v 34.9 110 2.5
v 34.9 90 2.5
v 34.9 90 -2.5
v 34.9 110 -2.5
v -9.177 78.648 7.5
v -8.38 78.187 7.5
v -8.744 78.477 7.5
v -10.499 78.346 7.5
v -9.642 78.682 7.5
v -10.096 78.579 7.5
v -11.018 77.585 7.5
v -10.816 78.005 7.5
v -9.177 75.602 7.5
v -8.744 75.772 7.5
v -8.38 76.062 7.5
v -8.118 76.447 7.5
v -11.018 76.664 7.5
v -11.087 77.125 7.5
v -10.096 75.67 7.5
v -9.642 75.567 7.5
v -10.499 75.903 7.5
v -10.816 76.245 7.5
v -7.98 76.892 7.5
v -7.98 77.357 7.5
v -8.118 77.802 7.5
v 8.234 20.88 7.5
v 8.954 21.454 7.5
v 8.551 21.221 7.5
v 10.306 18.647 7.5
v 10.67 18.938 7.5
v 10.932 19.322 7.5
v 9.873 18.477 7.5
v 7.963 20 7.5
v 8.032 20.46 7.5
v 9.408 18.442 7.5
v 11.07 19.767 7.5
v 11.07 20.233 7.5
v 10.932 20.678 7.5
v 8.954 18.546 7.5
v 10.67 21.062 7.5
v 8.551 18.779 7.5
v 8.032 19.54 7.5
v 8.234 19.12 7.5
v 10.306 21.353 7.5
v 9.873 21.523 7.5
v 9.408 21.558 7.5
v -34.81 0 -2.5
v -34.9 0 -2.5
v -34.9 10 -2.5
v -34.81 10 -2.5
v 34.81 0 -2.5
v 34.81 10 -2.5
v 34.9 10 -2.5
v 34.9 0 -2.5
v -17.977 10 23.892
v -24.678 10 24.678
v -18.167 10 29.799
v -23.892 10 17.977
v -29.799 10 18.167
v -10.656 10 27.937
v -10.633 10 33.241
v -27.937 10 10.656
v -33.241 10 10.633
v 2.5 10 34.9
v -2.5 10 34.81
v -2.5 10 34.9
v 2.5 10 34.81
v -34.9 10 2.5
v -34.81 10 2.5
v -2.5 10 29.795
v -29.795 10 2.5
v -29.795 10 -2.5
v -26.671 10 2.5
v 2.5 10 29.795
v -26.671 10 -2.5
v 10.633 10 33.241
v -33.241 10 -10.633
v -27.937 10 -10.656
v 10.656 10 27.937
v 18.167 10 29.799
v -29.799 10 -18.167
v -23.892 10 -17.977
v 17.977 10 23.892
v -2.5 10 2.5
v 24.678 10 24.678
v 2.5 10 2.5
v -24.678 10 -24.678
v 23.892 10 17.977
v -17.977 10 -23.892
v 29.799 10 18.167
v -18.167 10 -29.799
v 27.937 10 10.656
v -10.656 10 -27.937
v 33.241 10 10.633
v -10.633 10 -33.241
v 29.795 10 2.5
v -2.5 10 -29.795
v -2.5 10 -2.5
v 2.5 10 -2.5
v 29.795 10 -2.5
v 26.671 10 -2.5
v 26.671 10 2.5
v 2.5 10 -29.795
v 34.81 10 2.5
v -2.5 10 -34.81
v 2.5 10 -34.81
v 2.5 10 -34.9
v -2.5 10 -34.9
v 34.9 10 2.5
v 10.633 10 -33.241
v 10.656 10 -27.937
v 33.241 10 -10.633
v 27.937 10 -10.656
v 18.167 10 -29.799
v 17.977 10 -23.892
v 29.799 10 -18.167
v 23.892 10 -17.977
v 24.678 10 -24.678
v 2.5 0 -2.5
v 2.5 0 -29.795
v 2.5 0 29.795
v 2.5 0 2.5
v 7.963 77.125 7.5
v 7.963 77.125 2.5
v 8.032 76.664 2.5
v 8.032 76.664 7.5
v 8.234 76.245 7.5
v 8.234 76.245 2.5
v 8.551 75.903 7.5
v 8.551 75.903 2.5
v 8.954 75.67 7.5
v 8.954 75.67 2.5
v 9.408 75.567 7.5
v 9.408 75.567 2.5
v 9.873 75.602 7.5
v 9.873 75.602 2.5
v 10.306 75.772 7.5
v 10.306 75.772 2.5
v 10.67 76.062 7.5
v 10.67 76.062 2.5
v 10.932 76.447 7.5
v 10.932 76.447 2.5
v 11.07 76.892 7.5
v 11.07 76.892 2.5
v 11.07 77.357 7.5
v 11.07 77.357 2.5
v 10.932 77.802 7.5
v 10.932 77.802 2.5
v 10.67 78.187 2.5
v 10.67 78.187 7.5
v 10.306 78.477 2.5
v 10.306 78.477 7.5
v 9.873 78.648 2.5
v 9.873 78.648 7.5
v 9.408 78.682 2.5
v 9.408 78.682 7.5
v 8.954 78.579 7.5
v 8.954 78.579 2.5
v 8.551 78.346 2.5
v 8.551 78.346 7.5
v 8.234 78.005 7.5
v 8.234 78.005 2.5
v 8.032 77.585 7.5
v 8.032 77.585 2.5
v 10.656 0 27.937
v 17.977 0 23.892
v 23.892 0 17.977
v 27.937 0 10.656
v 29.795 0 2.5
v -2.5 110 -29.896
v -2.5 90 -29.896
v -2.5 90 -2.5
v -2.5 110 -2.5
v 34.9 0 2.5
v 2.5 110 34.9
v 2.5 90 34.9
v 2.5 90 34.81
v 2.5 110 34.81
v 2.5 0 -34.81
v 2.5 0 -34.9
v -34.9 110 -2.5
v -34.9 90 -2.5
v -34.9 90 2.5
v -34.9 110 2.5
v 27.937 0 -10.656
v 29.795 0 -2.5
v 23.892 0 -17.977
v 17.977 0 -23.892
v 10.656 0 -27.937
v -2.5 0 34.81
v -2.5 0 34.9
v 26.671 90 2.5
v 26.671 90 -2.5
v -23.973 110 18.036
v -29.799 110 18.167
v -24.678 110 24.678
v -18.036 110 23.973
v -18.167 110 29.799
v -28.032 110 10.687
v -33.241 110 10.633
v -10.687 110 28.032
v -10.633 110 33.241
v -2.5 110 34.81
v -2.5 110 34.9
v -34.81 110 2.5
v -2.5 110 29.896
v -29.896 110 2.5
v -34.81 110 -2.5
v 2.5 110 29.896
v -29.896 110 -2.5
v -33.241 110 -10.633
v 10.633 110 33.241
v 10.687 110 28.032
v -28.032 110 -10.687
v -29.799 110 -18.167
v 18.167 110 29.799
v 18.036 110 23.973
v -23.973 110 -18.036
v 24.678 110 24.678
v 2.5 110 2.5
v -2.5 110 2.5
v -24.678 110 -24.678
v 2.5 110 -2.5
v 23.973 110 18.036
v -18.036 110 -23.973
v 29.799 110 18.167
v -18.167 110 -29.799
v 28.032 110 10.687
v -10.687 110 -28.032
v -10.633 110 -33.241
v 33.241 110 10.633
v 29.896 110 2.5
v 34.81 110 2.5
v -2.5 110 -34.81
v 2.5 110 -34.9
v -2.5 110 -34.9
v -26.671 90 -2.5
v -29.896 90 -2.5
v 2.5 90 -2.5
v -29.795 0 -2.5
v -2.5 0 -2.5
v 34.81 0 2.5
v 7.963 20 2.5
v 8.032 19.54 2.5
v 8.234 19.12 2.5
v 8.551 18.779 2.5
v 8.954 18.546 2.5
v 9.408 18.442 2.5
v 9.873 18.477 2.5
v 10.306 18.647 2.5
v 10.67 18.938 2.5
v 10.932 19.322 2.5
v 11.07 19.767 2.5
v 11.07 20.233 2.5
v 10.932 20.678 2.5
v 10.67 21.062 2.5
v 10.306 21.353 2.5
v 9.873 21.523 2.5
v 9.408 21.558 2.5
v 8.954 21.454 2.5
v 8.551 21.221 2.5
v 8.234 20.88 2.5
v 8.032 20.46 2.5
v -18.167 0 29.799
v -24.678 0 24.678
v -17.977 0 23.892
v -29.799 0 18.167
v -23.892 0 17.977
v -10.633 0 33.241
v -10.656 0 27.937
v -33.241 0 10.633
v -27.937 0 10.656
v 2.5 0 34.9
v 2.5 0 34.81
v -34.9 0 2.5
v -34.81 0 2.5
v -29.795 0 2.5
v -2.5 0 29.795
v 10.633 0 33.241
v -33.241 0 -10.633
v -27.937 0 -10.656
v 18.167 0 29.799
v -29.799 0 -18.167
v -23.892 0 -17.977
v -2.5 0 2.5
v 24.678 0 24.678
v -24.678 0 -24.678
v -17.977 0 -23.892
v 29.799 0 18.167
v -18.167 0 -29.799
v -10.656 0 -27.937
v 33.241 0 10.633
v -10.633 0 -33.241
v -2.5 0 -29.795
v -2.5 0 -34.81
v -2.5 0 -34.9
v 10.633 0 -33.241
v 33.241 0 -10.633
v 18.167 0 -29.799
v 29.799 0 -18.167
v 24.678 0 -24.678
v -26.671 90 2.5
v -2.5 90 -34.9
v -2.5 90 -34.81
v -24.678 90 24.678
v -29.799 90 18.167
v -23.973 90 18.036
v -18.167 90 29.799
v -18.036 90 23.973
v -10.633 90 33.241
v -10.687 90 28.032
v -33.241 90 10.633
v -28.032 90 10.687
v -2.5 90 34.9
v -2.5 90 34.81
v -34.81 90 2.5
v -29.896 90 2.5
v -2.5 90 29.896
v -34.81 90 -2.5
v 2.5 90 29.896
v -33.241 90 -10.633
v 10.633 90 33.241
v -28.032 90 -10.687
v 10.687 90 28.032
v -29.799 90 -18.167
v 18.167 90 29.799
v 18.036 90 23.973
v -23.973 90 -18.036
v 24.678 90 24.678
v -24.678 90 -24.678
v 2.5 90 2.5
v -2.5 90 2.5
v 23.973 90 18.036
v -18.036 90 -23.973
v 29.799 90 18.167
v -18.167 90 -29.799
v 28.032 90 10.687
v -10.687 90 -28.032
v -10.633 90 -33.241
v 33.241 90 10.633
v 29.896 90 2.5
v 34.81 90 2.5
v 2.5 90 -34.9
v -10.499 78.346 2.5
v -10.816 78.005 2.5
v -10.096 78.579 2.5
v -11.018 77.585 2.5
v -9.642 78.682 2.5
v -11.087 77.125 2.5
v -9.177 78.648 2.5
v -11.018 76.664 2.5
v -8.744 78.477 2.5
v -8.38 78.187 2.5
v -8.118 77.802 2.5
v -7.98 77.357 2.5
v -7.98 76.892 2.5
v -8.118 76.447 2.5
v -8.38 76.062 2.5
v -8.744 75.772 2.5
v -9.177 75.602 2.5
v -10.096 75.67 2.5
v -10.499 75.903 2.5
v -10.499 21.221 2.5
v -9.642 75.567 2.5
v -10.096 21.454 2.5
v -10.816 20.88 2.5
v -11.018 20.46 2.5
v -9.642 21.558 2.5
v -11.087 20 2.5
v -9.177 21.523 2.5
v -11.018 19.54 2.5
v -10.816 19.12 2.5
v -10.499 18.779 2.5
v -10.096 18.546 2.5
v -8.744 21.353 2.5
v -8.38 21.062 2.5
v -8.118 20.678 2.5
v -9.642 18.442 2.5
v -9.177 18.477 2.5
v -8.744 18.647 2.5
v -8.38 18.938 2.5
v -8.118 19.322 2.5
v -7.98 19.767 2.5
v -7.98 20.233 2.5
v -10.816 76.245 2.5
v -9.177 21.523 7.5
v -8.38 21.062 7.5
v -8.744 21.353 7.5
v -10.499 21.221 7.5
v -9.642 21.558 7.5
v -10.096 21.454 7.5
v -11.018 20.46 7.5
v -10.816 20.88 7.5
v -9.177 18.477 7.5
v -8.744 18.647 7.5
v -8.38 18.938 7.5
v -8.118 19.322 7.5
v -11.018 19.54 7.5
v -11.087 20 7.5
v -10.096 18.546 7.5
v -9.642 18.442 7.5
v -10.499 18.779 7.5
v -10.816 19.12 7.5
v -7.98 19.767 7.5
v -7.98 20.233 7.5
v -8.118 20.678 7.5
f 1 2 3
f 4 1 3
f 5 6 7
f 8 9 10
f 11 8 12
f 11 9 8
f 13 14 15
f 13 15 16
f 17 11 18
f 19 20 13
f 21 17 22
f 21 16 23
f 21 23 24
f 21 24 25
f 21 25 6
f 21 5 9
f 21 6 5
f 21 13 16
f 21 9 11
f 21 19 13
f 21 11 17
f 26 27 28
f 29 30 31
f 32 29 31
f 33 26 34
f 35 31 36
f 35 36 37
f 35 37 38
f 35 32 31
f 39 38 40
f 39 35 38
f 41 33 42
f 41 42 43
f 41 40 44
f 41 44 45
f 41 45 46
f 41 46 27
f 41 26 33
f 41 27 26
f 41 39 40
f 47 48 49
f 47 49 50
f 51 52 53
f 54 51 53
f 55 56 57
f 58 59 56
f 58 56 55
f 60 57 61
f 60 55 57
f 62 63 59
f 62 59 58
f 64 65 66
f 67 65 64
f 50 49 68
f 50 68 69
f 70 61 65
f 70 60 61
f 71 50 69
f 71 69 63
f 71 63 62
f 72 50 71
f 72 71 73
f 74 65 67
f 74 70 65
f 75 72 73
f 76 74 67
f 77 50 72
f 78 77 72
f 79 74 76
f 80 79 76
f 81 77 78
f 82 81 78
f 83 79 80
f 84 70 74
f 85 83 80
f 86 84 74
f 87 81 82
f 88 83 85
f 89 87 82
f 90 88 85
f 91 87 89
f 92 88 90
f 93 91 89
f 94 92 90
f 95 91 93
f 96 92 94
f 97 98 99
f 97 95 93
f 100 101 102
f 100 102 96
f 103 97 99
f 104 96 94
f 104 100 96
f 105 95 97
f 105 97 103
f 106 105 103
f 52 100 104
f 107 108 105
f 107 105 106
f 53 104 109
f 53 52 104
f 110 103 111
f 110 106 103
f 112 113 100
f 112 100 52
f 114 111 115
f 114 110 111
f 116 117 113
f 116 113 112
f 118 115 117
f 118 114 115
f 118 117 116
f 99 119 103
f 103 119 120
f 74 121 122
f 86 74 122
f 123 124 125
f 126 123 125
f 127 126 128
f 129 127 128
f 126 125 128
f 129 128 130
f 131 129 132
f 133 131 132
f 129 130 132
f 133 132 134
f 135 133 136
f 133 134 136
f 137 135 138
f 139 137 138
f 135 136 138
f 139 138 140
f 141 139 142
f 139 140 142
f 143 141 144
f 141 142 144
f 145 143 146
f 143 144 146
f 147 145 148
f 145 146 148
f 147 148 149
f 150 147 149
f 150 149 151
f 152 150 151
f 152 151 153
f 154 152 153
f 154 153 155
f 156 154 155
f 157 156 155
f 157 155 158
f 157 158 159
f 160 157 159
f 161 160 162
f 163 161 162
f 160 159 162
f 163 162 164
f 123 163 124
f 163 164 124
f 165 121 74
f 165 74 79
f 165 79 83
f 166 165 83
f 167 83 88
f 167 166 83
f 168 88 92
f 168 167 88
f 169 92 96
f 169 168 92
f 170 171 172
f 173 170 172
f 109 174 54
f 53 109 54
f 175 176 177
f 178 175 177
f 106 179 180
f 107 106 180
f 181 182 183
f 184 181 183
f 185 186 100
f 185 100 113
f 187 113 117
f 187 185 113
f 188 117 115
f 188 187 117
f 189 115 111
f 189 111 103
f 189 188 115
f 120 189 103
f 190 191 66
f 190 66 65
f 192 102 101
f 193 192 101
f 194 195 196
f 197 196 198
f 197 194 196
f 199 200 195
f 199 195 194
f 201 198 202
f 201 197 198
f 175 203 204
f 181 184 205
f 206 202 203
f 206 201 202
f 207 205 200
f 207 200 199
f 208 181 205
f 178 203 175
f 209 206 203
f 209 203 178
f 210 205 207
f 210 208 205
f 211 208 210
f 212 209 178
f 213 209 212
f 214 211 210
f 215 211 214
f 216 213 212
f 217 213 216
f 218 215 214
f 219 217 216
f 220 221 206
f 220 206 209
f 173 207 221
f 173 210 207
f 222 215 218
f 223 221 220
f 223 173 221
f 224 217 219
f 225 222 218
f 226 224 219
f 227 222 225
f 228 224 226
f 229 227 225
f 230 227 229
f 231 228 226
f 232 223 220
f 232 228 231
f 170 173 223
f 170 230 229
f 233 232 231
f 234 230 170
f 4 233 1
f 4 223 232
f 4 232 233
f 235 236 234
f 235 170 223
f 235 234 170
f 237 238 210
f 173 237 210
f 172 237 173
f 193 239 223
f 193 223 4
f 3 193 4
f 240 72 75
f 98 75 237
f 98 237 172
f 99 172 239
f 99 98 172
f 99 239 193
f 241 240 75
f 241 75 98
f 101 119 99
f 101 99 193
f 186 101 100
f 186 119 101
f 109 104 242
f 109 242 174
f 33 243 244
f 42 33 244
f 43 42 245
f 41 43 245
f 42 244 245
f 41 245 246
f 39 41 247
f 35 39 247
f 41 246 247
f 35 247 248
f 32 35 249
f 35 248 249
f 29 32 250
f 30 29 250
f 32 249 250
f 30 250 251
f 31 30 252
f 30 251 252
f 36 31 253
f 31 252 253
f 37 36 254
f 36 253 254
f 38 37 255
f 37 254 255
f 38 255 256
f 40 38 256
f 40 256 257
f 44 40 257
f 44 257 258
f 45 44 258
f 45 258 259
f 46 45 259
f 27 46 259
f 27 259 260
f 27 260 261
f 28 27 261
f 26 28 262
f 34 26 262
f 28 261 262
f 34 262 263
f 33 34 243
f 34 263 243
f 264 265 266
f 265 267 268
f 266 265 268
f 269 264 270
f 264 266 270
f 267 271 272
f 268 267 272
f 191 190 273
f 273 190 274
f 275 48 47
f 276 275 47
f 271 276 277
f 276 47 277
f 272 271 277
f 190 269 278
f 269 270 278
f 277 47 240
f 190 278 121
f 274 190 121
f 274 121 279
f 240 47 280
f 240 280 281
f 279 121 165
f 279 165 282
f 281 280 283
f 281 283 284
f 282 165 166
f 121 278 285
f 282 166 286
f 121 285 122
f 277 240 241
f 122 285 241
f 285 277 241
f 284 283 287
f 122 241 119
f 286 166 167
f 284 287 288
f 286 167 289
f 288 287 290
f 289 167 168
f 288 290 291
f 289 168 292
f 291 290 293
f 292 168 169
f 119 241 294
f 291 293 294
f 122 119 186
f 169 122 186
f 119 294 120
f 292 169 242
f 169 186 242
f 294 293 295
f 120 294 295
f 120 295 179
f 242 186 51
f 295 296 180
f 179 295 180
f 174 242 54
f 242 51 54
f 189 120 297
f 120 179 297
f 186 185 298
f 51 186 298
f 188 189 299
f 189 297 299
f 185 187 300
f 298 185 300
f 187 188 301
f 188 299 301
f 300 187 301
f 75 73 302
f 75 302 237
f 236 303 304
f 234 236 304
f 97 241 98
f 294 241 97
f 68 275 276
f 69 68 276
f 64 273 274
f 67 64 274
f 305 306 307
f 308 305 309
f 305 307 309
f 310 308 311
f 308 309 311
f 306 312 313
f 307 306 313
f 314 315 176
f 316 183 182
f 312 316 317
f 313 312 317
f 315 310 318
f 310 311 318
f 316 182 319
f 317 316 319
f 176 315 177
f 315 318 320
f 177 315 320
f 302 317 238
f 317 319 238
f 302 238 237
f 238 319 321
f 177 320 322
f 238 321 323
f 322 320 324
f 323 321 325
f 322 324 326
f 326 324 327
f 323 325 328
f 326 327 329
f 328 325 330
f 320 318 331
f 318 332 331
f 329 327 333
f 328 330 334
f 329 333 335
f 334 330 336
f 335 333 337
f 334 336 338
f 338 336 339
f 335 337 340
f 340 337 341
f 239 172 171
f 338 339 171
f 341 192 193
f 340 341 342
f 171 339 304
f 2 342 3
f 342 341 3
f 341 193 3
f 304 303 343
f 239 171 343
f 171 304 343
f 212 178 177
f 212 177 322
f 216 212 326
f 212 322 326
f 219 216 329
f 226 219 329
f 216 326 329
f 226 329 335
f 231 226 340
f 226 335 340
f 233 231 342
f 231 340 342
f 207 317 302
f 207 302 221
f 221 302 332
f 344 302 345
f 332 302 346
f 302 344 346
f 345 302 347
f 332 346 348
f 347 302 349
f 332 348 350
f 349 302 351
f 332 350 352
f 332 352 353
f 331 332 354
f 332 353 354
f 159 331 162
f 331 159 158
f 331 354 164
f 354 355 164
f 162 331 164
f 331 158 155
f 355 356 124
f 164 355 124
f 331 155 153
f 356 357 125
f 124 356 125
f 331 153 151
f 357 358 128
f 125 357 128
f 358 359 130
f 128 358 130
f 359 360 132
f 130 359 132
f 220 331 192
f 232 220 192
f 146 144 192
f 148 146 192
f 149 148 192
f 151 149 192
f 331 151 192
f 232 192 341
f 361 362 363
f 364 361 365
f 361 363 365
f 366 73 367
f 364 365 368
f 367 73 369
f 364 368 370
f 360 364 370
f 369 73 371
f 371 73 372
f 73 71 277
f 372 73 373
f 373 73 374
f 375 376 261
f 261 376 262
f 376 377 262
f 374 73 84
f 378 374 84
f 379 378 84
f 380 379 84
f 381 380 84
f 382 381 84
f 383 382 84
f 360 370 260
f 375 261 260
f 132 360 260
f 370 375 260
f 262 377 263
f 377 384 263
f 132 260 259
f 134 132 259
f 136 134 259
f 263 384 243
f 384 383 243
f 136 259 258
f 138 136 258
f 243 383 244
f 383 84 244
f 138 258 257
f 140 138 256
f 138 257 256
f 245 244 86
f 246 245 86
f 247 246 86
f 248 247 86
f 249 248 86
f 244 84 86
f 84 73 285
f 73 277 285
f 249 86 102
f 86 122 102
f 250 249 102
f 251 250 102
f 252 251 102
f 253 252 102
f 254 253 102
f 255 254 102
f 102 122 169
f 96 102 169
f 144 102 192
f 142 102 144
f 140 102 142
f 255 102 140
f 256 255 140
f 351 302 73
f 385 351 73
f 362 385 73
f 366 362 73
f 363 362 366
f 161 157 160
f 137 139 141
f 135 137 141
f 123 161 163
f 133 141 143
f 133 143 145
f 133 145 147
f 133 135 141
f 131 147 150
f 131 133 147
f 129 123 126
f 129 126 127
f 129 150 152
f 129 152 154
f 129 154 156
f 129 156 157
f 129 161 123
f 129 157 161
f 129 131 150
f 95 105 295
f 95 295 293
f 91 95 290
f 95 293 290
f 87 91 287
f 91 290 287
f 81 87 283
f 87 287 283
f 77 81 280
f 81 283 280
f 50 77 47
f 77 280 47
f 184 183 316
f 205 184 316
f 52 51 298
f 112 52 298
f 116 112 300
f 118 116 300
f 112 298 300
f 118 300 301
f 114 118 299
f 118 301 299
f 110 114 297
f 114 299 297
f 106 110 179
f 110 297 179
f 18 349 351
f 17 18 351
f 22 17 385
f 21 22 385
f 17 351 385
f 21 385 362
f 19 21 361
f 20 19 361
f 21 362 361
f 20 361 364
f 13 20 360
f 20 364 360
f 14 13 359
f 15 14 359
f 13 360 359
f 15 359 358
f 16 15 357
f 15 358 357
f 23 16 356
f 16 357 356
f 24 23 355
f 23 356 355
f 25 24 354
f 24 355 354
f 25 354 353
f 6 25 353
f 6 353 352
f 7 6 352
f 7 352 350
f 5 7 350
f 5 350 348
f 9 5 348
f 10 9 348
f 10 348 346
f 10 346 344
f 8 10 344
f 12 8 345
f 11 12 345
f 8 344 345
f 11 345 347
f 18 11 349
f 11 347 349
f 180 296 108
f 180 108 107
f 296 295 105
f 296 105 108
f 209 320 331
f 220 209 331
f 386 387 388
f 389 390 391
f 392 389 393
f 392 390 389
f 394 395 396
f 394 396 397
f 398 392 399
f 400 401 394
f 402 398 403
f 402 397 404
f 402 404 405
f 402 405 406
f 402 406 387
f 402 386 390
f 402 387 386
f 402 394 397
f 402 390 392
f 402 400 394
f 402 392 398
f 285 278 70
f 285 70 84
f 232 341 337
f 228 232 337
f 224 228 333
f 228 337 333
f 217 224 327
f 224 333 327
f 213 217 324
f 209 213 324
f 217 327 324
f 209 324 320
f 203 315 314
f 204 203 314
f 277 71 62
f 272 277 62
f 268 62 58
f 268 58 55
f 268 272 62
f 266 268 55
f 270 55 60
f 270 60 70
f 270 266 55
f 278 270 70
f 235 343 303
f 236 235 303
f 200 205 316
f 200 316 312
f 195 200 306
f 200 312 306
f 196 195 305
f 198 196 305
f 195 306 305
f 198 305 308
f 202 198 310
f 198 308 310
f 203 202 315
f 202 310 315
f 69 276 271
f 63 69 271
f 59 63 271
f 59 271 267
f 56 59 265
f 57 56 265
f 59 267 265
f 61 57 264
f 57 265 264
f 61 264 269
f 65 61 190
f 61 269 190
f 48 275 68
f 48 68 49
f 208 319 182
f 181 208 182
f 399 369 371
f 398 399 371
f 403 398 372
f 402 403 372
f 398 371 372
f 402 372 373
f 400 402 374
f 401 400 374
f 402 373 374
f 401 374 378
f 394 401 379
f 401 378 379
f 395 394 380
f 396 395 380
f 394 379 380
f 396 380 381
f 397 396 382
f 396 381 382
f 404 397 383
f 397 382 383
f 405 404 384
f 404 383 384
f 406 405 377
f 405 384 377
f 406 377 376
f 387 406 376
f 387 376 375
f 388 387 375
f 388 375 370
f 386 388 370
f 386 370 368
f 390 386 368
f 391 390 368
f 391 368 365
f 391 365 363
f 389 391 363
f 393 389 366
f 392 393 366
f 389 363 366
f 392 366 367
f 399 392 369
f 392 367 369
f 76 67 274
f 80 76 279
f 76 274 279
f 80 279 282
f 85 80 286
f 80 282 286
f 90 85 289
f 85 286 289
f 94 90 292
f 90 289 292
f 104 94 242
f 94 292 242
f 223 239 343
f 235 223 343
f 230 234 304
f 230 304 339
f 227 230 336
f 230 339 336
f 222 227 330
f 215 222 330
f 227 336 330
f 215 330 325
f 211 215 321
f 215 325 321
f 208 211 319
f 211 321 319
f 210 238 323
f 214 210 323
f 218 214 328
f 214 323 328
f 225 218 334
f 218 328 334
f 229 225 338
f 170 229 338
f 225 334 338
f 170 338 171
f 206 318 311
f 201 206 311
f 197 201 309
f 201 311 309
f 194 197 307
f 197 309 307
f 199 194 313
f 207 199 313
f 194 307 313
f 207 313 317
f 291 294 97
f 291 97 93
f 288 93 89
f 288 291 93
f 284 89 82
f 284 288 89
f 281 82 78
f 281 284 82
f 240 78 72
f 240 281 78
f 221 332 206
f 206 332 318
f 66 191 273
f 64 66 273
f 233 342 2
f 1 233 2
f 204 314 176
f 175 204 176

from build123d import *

# Parameters (mm, degrees)
SKETCH1_R           = 34.9
SKETCH1_R_2         = 29.9
EXTRUDE_THIN1_DEPTH = 10
SKETCH1_3_W         = 5
SKETCH1_3_H         = 69.8
SKETCH1_3_W_2       = 69.8
SKETCH1_3_H_2       = 5
EXTRUDE_THIN2_DEPTH = 10
SKETCH2_W           = 53.342781532
SKETCH2_H           = 5
BOSS_EXTRUDE1_DEPTH = 80
SKETCH3_R           = 1.5621
BOSS_EXTRUDE2_DEPTH = 5
BOSS_EXTRUDE4_DEPTH = 20
SKETCH6_6_W         = 5
SKETCH6_6_H         = 69.8
SKETCH6_6_W_2       = 69.8
SKETCH6_6_H_2       = 5
EXTRUDE_THIN4_DEPTH = 20


with BuildPart() as part:
    # Sketch1 → Extrude-Thin1 (new body)
    with BuildSketch(Plane(origin=(0, 0, 0), x_dir=(1, 0, 0), z_dir=(0, 1, 0))):
        Circle(SKETCH1_R)
        Circle(SKETCH1_R_2, mode=Mode.SUBTRACT)
    extrude(amount=EXTRUDE_THIN1_DEPTH)

    # Sketch1<3> → Extrude-Thin2 (add)
    with BuildSketch(Plane(origin=(0, 0, 0), x_dir=(1, 0, 0), z_dir=(0, 1, 0))):
        Rectangle(SKETCH1_3_W, SKETCH1_3_H)
        Rectangle(SKETCH1_3_W_2, SKETCH1_3_H_2)
    extrude(amount=EXTRUDE_THIN2_DEPTH)

    # Sketch2 → Boss-Extrude1 (add)
    with BuildSketch(Plane(origin=(0, 10, 0), x_dir=(1, 0, 0), z_dir=(0, 1, 0))):
        Rectangle(SKETCH2_W, SKETCH2_H)
    extrude(amount=BOSS_EXTRUDE1_DEPTH)

    # Sketch3 → Boss-Extrude2 (add)
    with BuildSketch(Plane.XY.offset(2.5)):
        with Locations((-9.525, 77.1246)):
            Circle(SKETCH3_R)
        with Locations((-9.525, 20)):
            Circle(SKETCH3_R)
        with Locations((9.525, 20)):
            Circle(SKETCH3_R)
        with Locations((9.525, 77.1246)):
            Circle(SKETCH3_R)
    extrude(amount=BOSS_EXTRUDE2_DEPTH)



with BuildPart() as body_2:
    # Sketch6 → Boss-Extrude4 (new body)
    with BuildSketch(Plane(origin=(0, 90, 0), x_dir=(1, 0, 0), z_dir=(0, 1, 0))):
        with BuildLine():
            Line((0, 30), (0, 34.9))
            ThreePointArc((0, 34.9), (-24.678026663, -24.678026663), (34.9, 0))
            Line((34.9, 0), (30, 0))
            ThreePointArc((30, 0), (-21.213203436, -21.213203436), (0, 30))
        make_face()
    extrude(amount=BOSS_EXTRUDE4_DEPTH)


with BuildPart() as part_1:
    add(part.part)

    add(body_2.part)  # Extrude-Thin4 merges body 2
    # Sketch6<6> → Extrude-Thin4 (add)
    with BuildSketch(Plane(origin=(0, 90, 0), x_dir=(1, 0, 0), z_dir=(0, 1, 0))):
        Rectangle(SKETCH6_6_W, SKETCH6_6_H)
        Rectangle(SKETCH6_6_W_2, SKETCH6_6_H_2)
    extrude(amount=EXTRUDE_THIN4_DEPTH)


solid = part_1.part
